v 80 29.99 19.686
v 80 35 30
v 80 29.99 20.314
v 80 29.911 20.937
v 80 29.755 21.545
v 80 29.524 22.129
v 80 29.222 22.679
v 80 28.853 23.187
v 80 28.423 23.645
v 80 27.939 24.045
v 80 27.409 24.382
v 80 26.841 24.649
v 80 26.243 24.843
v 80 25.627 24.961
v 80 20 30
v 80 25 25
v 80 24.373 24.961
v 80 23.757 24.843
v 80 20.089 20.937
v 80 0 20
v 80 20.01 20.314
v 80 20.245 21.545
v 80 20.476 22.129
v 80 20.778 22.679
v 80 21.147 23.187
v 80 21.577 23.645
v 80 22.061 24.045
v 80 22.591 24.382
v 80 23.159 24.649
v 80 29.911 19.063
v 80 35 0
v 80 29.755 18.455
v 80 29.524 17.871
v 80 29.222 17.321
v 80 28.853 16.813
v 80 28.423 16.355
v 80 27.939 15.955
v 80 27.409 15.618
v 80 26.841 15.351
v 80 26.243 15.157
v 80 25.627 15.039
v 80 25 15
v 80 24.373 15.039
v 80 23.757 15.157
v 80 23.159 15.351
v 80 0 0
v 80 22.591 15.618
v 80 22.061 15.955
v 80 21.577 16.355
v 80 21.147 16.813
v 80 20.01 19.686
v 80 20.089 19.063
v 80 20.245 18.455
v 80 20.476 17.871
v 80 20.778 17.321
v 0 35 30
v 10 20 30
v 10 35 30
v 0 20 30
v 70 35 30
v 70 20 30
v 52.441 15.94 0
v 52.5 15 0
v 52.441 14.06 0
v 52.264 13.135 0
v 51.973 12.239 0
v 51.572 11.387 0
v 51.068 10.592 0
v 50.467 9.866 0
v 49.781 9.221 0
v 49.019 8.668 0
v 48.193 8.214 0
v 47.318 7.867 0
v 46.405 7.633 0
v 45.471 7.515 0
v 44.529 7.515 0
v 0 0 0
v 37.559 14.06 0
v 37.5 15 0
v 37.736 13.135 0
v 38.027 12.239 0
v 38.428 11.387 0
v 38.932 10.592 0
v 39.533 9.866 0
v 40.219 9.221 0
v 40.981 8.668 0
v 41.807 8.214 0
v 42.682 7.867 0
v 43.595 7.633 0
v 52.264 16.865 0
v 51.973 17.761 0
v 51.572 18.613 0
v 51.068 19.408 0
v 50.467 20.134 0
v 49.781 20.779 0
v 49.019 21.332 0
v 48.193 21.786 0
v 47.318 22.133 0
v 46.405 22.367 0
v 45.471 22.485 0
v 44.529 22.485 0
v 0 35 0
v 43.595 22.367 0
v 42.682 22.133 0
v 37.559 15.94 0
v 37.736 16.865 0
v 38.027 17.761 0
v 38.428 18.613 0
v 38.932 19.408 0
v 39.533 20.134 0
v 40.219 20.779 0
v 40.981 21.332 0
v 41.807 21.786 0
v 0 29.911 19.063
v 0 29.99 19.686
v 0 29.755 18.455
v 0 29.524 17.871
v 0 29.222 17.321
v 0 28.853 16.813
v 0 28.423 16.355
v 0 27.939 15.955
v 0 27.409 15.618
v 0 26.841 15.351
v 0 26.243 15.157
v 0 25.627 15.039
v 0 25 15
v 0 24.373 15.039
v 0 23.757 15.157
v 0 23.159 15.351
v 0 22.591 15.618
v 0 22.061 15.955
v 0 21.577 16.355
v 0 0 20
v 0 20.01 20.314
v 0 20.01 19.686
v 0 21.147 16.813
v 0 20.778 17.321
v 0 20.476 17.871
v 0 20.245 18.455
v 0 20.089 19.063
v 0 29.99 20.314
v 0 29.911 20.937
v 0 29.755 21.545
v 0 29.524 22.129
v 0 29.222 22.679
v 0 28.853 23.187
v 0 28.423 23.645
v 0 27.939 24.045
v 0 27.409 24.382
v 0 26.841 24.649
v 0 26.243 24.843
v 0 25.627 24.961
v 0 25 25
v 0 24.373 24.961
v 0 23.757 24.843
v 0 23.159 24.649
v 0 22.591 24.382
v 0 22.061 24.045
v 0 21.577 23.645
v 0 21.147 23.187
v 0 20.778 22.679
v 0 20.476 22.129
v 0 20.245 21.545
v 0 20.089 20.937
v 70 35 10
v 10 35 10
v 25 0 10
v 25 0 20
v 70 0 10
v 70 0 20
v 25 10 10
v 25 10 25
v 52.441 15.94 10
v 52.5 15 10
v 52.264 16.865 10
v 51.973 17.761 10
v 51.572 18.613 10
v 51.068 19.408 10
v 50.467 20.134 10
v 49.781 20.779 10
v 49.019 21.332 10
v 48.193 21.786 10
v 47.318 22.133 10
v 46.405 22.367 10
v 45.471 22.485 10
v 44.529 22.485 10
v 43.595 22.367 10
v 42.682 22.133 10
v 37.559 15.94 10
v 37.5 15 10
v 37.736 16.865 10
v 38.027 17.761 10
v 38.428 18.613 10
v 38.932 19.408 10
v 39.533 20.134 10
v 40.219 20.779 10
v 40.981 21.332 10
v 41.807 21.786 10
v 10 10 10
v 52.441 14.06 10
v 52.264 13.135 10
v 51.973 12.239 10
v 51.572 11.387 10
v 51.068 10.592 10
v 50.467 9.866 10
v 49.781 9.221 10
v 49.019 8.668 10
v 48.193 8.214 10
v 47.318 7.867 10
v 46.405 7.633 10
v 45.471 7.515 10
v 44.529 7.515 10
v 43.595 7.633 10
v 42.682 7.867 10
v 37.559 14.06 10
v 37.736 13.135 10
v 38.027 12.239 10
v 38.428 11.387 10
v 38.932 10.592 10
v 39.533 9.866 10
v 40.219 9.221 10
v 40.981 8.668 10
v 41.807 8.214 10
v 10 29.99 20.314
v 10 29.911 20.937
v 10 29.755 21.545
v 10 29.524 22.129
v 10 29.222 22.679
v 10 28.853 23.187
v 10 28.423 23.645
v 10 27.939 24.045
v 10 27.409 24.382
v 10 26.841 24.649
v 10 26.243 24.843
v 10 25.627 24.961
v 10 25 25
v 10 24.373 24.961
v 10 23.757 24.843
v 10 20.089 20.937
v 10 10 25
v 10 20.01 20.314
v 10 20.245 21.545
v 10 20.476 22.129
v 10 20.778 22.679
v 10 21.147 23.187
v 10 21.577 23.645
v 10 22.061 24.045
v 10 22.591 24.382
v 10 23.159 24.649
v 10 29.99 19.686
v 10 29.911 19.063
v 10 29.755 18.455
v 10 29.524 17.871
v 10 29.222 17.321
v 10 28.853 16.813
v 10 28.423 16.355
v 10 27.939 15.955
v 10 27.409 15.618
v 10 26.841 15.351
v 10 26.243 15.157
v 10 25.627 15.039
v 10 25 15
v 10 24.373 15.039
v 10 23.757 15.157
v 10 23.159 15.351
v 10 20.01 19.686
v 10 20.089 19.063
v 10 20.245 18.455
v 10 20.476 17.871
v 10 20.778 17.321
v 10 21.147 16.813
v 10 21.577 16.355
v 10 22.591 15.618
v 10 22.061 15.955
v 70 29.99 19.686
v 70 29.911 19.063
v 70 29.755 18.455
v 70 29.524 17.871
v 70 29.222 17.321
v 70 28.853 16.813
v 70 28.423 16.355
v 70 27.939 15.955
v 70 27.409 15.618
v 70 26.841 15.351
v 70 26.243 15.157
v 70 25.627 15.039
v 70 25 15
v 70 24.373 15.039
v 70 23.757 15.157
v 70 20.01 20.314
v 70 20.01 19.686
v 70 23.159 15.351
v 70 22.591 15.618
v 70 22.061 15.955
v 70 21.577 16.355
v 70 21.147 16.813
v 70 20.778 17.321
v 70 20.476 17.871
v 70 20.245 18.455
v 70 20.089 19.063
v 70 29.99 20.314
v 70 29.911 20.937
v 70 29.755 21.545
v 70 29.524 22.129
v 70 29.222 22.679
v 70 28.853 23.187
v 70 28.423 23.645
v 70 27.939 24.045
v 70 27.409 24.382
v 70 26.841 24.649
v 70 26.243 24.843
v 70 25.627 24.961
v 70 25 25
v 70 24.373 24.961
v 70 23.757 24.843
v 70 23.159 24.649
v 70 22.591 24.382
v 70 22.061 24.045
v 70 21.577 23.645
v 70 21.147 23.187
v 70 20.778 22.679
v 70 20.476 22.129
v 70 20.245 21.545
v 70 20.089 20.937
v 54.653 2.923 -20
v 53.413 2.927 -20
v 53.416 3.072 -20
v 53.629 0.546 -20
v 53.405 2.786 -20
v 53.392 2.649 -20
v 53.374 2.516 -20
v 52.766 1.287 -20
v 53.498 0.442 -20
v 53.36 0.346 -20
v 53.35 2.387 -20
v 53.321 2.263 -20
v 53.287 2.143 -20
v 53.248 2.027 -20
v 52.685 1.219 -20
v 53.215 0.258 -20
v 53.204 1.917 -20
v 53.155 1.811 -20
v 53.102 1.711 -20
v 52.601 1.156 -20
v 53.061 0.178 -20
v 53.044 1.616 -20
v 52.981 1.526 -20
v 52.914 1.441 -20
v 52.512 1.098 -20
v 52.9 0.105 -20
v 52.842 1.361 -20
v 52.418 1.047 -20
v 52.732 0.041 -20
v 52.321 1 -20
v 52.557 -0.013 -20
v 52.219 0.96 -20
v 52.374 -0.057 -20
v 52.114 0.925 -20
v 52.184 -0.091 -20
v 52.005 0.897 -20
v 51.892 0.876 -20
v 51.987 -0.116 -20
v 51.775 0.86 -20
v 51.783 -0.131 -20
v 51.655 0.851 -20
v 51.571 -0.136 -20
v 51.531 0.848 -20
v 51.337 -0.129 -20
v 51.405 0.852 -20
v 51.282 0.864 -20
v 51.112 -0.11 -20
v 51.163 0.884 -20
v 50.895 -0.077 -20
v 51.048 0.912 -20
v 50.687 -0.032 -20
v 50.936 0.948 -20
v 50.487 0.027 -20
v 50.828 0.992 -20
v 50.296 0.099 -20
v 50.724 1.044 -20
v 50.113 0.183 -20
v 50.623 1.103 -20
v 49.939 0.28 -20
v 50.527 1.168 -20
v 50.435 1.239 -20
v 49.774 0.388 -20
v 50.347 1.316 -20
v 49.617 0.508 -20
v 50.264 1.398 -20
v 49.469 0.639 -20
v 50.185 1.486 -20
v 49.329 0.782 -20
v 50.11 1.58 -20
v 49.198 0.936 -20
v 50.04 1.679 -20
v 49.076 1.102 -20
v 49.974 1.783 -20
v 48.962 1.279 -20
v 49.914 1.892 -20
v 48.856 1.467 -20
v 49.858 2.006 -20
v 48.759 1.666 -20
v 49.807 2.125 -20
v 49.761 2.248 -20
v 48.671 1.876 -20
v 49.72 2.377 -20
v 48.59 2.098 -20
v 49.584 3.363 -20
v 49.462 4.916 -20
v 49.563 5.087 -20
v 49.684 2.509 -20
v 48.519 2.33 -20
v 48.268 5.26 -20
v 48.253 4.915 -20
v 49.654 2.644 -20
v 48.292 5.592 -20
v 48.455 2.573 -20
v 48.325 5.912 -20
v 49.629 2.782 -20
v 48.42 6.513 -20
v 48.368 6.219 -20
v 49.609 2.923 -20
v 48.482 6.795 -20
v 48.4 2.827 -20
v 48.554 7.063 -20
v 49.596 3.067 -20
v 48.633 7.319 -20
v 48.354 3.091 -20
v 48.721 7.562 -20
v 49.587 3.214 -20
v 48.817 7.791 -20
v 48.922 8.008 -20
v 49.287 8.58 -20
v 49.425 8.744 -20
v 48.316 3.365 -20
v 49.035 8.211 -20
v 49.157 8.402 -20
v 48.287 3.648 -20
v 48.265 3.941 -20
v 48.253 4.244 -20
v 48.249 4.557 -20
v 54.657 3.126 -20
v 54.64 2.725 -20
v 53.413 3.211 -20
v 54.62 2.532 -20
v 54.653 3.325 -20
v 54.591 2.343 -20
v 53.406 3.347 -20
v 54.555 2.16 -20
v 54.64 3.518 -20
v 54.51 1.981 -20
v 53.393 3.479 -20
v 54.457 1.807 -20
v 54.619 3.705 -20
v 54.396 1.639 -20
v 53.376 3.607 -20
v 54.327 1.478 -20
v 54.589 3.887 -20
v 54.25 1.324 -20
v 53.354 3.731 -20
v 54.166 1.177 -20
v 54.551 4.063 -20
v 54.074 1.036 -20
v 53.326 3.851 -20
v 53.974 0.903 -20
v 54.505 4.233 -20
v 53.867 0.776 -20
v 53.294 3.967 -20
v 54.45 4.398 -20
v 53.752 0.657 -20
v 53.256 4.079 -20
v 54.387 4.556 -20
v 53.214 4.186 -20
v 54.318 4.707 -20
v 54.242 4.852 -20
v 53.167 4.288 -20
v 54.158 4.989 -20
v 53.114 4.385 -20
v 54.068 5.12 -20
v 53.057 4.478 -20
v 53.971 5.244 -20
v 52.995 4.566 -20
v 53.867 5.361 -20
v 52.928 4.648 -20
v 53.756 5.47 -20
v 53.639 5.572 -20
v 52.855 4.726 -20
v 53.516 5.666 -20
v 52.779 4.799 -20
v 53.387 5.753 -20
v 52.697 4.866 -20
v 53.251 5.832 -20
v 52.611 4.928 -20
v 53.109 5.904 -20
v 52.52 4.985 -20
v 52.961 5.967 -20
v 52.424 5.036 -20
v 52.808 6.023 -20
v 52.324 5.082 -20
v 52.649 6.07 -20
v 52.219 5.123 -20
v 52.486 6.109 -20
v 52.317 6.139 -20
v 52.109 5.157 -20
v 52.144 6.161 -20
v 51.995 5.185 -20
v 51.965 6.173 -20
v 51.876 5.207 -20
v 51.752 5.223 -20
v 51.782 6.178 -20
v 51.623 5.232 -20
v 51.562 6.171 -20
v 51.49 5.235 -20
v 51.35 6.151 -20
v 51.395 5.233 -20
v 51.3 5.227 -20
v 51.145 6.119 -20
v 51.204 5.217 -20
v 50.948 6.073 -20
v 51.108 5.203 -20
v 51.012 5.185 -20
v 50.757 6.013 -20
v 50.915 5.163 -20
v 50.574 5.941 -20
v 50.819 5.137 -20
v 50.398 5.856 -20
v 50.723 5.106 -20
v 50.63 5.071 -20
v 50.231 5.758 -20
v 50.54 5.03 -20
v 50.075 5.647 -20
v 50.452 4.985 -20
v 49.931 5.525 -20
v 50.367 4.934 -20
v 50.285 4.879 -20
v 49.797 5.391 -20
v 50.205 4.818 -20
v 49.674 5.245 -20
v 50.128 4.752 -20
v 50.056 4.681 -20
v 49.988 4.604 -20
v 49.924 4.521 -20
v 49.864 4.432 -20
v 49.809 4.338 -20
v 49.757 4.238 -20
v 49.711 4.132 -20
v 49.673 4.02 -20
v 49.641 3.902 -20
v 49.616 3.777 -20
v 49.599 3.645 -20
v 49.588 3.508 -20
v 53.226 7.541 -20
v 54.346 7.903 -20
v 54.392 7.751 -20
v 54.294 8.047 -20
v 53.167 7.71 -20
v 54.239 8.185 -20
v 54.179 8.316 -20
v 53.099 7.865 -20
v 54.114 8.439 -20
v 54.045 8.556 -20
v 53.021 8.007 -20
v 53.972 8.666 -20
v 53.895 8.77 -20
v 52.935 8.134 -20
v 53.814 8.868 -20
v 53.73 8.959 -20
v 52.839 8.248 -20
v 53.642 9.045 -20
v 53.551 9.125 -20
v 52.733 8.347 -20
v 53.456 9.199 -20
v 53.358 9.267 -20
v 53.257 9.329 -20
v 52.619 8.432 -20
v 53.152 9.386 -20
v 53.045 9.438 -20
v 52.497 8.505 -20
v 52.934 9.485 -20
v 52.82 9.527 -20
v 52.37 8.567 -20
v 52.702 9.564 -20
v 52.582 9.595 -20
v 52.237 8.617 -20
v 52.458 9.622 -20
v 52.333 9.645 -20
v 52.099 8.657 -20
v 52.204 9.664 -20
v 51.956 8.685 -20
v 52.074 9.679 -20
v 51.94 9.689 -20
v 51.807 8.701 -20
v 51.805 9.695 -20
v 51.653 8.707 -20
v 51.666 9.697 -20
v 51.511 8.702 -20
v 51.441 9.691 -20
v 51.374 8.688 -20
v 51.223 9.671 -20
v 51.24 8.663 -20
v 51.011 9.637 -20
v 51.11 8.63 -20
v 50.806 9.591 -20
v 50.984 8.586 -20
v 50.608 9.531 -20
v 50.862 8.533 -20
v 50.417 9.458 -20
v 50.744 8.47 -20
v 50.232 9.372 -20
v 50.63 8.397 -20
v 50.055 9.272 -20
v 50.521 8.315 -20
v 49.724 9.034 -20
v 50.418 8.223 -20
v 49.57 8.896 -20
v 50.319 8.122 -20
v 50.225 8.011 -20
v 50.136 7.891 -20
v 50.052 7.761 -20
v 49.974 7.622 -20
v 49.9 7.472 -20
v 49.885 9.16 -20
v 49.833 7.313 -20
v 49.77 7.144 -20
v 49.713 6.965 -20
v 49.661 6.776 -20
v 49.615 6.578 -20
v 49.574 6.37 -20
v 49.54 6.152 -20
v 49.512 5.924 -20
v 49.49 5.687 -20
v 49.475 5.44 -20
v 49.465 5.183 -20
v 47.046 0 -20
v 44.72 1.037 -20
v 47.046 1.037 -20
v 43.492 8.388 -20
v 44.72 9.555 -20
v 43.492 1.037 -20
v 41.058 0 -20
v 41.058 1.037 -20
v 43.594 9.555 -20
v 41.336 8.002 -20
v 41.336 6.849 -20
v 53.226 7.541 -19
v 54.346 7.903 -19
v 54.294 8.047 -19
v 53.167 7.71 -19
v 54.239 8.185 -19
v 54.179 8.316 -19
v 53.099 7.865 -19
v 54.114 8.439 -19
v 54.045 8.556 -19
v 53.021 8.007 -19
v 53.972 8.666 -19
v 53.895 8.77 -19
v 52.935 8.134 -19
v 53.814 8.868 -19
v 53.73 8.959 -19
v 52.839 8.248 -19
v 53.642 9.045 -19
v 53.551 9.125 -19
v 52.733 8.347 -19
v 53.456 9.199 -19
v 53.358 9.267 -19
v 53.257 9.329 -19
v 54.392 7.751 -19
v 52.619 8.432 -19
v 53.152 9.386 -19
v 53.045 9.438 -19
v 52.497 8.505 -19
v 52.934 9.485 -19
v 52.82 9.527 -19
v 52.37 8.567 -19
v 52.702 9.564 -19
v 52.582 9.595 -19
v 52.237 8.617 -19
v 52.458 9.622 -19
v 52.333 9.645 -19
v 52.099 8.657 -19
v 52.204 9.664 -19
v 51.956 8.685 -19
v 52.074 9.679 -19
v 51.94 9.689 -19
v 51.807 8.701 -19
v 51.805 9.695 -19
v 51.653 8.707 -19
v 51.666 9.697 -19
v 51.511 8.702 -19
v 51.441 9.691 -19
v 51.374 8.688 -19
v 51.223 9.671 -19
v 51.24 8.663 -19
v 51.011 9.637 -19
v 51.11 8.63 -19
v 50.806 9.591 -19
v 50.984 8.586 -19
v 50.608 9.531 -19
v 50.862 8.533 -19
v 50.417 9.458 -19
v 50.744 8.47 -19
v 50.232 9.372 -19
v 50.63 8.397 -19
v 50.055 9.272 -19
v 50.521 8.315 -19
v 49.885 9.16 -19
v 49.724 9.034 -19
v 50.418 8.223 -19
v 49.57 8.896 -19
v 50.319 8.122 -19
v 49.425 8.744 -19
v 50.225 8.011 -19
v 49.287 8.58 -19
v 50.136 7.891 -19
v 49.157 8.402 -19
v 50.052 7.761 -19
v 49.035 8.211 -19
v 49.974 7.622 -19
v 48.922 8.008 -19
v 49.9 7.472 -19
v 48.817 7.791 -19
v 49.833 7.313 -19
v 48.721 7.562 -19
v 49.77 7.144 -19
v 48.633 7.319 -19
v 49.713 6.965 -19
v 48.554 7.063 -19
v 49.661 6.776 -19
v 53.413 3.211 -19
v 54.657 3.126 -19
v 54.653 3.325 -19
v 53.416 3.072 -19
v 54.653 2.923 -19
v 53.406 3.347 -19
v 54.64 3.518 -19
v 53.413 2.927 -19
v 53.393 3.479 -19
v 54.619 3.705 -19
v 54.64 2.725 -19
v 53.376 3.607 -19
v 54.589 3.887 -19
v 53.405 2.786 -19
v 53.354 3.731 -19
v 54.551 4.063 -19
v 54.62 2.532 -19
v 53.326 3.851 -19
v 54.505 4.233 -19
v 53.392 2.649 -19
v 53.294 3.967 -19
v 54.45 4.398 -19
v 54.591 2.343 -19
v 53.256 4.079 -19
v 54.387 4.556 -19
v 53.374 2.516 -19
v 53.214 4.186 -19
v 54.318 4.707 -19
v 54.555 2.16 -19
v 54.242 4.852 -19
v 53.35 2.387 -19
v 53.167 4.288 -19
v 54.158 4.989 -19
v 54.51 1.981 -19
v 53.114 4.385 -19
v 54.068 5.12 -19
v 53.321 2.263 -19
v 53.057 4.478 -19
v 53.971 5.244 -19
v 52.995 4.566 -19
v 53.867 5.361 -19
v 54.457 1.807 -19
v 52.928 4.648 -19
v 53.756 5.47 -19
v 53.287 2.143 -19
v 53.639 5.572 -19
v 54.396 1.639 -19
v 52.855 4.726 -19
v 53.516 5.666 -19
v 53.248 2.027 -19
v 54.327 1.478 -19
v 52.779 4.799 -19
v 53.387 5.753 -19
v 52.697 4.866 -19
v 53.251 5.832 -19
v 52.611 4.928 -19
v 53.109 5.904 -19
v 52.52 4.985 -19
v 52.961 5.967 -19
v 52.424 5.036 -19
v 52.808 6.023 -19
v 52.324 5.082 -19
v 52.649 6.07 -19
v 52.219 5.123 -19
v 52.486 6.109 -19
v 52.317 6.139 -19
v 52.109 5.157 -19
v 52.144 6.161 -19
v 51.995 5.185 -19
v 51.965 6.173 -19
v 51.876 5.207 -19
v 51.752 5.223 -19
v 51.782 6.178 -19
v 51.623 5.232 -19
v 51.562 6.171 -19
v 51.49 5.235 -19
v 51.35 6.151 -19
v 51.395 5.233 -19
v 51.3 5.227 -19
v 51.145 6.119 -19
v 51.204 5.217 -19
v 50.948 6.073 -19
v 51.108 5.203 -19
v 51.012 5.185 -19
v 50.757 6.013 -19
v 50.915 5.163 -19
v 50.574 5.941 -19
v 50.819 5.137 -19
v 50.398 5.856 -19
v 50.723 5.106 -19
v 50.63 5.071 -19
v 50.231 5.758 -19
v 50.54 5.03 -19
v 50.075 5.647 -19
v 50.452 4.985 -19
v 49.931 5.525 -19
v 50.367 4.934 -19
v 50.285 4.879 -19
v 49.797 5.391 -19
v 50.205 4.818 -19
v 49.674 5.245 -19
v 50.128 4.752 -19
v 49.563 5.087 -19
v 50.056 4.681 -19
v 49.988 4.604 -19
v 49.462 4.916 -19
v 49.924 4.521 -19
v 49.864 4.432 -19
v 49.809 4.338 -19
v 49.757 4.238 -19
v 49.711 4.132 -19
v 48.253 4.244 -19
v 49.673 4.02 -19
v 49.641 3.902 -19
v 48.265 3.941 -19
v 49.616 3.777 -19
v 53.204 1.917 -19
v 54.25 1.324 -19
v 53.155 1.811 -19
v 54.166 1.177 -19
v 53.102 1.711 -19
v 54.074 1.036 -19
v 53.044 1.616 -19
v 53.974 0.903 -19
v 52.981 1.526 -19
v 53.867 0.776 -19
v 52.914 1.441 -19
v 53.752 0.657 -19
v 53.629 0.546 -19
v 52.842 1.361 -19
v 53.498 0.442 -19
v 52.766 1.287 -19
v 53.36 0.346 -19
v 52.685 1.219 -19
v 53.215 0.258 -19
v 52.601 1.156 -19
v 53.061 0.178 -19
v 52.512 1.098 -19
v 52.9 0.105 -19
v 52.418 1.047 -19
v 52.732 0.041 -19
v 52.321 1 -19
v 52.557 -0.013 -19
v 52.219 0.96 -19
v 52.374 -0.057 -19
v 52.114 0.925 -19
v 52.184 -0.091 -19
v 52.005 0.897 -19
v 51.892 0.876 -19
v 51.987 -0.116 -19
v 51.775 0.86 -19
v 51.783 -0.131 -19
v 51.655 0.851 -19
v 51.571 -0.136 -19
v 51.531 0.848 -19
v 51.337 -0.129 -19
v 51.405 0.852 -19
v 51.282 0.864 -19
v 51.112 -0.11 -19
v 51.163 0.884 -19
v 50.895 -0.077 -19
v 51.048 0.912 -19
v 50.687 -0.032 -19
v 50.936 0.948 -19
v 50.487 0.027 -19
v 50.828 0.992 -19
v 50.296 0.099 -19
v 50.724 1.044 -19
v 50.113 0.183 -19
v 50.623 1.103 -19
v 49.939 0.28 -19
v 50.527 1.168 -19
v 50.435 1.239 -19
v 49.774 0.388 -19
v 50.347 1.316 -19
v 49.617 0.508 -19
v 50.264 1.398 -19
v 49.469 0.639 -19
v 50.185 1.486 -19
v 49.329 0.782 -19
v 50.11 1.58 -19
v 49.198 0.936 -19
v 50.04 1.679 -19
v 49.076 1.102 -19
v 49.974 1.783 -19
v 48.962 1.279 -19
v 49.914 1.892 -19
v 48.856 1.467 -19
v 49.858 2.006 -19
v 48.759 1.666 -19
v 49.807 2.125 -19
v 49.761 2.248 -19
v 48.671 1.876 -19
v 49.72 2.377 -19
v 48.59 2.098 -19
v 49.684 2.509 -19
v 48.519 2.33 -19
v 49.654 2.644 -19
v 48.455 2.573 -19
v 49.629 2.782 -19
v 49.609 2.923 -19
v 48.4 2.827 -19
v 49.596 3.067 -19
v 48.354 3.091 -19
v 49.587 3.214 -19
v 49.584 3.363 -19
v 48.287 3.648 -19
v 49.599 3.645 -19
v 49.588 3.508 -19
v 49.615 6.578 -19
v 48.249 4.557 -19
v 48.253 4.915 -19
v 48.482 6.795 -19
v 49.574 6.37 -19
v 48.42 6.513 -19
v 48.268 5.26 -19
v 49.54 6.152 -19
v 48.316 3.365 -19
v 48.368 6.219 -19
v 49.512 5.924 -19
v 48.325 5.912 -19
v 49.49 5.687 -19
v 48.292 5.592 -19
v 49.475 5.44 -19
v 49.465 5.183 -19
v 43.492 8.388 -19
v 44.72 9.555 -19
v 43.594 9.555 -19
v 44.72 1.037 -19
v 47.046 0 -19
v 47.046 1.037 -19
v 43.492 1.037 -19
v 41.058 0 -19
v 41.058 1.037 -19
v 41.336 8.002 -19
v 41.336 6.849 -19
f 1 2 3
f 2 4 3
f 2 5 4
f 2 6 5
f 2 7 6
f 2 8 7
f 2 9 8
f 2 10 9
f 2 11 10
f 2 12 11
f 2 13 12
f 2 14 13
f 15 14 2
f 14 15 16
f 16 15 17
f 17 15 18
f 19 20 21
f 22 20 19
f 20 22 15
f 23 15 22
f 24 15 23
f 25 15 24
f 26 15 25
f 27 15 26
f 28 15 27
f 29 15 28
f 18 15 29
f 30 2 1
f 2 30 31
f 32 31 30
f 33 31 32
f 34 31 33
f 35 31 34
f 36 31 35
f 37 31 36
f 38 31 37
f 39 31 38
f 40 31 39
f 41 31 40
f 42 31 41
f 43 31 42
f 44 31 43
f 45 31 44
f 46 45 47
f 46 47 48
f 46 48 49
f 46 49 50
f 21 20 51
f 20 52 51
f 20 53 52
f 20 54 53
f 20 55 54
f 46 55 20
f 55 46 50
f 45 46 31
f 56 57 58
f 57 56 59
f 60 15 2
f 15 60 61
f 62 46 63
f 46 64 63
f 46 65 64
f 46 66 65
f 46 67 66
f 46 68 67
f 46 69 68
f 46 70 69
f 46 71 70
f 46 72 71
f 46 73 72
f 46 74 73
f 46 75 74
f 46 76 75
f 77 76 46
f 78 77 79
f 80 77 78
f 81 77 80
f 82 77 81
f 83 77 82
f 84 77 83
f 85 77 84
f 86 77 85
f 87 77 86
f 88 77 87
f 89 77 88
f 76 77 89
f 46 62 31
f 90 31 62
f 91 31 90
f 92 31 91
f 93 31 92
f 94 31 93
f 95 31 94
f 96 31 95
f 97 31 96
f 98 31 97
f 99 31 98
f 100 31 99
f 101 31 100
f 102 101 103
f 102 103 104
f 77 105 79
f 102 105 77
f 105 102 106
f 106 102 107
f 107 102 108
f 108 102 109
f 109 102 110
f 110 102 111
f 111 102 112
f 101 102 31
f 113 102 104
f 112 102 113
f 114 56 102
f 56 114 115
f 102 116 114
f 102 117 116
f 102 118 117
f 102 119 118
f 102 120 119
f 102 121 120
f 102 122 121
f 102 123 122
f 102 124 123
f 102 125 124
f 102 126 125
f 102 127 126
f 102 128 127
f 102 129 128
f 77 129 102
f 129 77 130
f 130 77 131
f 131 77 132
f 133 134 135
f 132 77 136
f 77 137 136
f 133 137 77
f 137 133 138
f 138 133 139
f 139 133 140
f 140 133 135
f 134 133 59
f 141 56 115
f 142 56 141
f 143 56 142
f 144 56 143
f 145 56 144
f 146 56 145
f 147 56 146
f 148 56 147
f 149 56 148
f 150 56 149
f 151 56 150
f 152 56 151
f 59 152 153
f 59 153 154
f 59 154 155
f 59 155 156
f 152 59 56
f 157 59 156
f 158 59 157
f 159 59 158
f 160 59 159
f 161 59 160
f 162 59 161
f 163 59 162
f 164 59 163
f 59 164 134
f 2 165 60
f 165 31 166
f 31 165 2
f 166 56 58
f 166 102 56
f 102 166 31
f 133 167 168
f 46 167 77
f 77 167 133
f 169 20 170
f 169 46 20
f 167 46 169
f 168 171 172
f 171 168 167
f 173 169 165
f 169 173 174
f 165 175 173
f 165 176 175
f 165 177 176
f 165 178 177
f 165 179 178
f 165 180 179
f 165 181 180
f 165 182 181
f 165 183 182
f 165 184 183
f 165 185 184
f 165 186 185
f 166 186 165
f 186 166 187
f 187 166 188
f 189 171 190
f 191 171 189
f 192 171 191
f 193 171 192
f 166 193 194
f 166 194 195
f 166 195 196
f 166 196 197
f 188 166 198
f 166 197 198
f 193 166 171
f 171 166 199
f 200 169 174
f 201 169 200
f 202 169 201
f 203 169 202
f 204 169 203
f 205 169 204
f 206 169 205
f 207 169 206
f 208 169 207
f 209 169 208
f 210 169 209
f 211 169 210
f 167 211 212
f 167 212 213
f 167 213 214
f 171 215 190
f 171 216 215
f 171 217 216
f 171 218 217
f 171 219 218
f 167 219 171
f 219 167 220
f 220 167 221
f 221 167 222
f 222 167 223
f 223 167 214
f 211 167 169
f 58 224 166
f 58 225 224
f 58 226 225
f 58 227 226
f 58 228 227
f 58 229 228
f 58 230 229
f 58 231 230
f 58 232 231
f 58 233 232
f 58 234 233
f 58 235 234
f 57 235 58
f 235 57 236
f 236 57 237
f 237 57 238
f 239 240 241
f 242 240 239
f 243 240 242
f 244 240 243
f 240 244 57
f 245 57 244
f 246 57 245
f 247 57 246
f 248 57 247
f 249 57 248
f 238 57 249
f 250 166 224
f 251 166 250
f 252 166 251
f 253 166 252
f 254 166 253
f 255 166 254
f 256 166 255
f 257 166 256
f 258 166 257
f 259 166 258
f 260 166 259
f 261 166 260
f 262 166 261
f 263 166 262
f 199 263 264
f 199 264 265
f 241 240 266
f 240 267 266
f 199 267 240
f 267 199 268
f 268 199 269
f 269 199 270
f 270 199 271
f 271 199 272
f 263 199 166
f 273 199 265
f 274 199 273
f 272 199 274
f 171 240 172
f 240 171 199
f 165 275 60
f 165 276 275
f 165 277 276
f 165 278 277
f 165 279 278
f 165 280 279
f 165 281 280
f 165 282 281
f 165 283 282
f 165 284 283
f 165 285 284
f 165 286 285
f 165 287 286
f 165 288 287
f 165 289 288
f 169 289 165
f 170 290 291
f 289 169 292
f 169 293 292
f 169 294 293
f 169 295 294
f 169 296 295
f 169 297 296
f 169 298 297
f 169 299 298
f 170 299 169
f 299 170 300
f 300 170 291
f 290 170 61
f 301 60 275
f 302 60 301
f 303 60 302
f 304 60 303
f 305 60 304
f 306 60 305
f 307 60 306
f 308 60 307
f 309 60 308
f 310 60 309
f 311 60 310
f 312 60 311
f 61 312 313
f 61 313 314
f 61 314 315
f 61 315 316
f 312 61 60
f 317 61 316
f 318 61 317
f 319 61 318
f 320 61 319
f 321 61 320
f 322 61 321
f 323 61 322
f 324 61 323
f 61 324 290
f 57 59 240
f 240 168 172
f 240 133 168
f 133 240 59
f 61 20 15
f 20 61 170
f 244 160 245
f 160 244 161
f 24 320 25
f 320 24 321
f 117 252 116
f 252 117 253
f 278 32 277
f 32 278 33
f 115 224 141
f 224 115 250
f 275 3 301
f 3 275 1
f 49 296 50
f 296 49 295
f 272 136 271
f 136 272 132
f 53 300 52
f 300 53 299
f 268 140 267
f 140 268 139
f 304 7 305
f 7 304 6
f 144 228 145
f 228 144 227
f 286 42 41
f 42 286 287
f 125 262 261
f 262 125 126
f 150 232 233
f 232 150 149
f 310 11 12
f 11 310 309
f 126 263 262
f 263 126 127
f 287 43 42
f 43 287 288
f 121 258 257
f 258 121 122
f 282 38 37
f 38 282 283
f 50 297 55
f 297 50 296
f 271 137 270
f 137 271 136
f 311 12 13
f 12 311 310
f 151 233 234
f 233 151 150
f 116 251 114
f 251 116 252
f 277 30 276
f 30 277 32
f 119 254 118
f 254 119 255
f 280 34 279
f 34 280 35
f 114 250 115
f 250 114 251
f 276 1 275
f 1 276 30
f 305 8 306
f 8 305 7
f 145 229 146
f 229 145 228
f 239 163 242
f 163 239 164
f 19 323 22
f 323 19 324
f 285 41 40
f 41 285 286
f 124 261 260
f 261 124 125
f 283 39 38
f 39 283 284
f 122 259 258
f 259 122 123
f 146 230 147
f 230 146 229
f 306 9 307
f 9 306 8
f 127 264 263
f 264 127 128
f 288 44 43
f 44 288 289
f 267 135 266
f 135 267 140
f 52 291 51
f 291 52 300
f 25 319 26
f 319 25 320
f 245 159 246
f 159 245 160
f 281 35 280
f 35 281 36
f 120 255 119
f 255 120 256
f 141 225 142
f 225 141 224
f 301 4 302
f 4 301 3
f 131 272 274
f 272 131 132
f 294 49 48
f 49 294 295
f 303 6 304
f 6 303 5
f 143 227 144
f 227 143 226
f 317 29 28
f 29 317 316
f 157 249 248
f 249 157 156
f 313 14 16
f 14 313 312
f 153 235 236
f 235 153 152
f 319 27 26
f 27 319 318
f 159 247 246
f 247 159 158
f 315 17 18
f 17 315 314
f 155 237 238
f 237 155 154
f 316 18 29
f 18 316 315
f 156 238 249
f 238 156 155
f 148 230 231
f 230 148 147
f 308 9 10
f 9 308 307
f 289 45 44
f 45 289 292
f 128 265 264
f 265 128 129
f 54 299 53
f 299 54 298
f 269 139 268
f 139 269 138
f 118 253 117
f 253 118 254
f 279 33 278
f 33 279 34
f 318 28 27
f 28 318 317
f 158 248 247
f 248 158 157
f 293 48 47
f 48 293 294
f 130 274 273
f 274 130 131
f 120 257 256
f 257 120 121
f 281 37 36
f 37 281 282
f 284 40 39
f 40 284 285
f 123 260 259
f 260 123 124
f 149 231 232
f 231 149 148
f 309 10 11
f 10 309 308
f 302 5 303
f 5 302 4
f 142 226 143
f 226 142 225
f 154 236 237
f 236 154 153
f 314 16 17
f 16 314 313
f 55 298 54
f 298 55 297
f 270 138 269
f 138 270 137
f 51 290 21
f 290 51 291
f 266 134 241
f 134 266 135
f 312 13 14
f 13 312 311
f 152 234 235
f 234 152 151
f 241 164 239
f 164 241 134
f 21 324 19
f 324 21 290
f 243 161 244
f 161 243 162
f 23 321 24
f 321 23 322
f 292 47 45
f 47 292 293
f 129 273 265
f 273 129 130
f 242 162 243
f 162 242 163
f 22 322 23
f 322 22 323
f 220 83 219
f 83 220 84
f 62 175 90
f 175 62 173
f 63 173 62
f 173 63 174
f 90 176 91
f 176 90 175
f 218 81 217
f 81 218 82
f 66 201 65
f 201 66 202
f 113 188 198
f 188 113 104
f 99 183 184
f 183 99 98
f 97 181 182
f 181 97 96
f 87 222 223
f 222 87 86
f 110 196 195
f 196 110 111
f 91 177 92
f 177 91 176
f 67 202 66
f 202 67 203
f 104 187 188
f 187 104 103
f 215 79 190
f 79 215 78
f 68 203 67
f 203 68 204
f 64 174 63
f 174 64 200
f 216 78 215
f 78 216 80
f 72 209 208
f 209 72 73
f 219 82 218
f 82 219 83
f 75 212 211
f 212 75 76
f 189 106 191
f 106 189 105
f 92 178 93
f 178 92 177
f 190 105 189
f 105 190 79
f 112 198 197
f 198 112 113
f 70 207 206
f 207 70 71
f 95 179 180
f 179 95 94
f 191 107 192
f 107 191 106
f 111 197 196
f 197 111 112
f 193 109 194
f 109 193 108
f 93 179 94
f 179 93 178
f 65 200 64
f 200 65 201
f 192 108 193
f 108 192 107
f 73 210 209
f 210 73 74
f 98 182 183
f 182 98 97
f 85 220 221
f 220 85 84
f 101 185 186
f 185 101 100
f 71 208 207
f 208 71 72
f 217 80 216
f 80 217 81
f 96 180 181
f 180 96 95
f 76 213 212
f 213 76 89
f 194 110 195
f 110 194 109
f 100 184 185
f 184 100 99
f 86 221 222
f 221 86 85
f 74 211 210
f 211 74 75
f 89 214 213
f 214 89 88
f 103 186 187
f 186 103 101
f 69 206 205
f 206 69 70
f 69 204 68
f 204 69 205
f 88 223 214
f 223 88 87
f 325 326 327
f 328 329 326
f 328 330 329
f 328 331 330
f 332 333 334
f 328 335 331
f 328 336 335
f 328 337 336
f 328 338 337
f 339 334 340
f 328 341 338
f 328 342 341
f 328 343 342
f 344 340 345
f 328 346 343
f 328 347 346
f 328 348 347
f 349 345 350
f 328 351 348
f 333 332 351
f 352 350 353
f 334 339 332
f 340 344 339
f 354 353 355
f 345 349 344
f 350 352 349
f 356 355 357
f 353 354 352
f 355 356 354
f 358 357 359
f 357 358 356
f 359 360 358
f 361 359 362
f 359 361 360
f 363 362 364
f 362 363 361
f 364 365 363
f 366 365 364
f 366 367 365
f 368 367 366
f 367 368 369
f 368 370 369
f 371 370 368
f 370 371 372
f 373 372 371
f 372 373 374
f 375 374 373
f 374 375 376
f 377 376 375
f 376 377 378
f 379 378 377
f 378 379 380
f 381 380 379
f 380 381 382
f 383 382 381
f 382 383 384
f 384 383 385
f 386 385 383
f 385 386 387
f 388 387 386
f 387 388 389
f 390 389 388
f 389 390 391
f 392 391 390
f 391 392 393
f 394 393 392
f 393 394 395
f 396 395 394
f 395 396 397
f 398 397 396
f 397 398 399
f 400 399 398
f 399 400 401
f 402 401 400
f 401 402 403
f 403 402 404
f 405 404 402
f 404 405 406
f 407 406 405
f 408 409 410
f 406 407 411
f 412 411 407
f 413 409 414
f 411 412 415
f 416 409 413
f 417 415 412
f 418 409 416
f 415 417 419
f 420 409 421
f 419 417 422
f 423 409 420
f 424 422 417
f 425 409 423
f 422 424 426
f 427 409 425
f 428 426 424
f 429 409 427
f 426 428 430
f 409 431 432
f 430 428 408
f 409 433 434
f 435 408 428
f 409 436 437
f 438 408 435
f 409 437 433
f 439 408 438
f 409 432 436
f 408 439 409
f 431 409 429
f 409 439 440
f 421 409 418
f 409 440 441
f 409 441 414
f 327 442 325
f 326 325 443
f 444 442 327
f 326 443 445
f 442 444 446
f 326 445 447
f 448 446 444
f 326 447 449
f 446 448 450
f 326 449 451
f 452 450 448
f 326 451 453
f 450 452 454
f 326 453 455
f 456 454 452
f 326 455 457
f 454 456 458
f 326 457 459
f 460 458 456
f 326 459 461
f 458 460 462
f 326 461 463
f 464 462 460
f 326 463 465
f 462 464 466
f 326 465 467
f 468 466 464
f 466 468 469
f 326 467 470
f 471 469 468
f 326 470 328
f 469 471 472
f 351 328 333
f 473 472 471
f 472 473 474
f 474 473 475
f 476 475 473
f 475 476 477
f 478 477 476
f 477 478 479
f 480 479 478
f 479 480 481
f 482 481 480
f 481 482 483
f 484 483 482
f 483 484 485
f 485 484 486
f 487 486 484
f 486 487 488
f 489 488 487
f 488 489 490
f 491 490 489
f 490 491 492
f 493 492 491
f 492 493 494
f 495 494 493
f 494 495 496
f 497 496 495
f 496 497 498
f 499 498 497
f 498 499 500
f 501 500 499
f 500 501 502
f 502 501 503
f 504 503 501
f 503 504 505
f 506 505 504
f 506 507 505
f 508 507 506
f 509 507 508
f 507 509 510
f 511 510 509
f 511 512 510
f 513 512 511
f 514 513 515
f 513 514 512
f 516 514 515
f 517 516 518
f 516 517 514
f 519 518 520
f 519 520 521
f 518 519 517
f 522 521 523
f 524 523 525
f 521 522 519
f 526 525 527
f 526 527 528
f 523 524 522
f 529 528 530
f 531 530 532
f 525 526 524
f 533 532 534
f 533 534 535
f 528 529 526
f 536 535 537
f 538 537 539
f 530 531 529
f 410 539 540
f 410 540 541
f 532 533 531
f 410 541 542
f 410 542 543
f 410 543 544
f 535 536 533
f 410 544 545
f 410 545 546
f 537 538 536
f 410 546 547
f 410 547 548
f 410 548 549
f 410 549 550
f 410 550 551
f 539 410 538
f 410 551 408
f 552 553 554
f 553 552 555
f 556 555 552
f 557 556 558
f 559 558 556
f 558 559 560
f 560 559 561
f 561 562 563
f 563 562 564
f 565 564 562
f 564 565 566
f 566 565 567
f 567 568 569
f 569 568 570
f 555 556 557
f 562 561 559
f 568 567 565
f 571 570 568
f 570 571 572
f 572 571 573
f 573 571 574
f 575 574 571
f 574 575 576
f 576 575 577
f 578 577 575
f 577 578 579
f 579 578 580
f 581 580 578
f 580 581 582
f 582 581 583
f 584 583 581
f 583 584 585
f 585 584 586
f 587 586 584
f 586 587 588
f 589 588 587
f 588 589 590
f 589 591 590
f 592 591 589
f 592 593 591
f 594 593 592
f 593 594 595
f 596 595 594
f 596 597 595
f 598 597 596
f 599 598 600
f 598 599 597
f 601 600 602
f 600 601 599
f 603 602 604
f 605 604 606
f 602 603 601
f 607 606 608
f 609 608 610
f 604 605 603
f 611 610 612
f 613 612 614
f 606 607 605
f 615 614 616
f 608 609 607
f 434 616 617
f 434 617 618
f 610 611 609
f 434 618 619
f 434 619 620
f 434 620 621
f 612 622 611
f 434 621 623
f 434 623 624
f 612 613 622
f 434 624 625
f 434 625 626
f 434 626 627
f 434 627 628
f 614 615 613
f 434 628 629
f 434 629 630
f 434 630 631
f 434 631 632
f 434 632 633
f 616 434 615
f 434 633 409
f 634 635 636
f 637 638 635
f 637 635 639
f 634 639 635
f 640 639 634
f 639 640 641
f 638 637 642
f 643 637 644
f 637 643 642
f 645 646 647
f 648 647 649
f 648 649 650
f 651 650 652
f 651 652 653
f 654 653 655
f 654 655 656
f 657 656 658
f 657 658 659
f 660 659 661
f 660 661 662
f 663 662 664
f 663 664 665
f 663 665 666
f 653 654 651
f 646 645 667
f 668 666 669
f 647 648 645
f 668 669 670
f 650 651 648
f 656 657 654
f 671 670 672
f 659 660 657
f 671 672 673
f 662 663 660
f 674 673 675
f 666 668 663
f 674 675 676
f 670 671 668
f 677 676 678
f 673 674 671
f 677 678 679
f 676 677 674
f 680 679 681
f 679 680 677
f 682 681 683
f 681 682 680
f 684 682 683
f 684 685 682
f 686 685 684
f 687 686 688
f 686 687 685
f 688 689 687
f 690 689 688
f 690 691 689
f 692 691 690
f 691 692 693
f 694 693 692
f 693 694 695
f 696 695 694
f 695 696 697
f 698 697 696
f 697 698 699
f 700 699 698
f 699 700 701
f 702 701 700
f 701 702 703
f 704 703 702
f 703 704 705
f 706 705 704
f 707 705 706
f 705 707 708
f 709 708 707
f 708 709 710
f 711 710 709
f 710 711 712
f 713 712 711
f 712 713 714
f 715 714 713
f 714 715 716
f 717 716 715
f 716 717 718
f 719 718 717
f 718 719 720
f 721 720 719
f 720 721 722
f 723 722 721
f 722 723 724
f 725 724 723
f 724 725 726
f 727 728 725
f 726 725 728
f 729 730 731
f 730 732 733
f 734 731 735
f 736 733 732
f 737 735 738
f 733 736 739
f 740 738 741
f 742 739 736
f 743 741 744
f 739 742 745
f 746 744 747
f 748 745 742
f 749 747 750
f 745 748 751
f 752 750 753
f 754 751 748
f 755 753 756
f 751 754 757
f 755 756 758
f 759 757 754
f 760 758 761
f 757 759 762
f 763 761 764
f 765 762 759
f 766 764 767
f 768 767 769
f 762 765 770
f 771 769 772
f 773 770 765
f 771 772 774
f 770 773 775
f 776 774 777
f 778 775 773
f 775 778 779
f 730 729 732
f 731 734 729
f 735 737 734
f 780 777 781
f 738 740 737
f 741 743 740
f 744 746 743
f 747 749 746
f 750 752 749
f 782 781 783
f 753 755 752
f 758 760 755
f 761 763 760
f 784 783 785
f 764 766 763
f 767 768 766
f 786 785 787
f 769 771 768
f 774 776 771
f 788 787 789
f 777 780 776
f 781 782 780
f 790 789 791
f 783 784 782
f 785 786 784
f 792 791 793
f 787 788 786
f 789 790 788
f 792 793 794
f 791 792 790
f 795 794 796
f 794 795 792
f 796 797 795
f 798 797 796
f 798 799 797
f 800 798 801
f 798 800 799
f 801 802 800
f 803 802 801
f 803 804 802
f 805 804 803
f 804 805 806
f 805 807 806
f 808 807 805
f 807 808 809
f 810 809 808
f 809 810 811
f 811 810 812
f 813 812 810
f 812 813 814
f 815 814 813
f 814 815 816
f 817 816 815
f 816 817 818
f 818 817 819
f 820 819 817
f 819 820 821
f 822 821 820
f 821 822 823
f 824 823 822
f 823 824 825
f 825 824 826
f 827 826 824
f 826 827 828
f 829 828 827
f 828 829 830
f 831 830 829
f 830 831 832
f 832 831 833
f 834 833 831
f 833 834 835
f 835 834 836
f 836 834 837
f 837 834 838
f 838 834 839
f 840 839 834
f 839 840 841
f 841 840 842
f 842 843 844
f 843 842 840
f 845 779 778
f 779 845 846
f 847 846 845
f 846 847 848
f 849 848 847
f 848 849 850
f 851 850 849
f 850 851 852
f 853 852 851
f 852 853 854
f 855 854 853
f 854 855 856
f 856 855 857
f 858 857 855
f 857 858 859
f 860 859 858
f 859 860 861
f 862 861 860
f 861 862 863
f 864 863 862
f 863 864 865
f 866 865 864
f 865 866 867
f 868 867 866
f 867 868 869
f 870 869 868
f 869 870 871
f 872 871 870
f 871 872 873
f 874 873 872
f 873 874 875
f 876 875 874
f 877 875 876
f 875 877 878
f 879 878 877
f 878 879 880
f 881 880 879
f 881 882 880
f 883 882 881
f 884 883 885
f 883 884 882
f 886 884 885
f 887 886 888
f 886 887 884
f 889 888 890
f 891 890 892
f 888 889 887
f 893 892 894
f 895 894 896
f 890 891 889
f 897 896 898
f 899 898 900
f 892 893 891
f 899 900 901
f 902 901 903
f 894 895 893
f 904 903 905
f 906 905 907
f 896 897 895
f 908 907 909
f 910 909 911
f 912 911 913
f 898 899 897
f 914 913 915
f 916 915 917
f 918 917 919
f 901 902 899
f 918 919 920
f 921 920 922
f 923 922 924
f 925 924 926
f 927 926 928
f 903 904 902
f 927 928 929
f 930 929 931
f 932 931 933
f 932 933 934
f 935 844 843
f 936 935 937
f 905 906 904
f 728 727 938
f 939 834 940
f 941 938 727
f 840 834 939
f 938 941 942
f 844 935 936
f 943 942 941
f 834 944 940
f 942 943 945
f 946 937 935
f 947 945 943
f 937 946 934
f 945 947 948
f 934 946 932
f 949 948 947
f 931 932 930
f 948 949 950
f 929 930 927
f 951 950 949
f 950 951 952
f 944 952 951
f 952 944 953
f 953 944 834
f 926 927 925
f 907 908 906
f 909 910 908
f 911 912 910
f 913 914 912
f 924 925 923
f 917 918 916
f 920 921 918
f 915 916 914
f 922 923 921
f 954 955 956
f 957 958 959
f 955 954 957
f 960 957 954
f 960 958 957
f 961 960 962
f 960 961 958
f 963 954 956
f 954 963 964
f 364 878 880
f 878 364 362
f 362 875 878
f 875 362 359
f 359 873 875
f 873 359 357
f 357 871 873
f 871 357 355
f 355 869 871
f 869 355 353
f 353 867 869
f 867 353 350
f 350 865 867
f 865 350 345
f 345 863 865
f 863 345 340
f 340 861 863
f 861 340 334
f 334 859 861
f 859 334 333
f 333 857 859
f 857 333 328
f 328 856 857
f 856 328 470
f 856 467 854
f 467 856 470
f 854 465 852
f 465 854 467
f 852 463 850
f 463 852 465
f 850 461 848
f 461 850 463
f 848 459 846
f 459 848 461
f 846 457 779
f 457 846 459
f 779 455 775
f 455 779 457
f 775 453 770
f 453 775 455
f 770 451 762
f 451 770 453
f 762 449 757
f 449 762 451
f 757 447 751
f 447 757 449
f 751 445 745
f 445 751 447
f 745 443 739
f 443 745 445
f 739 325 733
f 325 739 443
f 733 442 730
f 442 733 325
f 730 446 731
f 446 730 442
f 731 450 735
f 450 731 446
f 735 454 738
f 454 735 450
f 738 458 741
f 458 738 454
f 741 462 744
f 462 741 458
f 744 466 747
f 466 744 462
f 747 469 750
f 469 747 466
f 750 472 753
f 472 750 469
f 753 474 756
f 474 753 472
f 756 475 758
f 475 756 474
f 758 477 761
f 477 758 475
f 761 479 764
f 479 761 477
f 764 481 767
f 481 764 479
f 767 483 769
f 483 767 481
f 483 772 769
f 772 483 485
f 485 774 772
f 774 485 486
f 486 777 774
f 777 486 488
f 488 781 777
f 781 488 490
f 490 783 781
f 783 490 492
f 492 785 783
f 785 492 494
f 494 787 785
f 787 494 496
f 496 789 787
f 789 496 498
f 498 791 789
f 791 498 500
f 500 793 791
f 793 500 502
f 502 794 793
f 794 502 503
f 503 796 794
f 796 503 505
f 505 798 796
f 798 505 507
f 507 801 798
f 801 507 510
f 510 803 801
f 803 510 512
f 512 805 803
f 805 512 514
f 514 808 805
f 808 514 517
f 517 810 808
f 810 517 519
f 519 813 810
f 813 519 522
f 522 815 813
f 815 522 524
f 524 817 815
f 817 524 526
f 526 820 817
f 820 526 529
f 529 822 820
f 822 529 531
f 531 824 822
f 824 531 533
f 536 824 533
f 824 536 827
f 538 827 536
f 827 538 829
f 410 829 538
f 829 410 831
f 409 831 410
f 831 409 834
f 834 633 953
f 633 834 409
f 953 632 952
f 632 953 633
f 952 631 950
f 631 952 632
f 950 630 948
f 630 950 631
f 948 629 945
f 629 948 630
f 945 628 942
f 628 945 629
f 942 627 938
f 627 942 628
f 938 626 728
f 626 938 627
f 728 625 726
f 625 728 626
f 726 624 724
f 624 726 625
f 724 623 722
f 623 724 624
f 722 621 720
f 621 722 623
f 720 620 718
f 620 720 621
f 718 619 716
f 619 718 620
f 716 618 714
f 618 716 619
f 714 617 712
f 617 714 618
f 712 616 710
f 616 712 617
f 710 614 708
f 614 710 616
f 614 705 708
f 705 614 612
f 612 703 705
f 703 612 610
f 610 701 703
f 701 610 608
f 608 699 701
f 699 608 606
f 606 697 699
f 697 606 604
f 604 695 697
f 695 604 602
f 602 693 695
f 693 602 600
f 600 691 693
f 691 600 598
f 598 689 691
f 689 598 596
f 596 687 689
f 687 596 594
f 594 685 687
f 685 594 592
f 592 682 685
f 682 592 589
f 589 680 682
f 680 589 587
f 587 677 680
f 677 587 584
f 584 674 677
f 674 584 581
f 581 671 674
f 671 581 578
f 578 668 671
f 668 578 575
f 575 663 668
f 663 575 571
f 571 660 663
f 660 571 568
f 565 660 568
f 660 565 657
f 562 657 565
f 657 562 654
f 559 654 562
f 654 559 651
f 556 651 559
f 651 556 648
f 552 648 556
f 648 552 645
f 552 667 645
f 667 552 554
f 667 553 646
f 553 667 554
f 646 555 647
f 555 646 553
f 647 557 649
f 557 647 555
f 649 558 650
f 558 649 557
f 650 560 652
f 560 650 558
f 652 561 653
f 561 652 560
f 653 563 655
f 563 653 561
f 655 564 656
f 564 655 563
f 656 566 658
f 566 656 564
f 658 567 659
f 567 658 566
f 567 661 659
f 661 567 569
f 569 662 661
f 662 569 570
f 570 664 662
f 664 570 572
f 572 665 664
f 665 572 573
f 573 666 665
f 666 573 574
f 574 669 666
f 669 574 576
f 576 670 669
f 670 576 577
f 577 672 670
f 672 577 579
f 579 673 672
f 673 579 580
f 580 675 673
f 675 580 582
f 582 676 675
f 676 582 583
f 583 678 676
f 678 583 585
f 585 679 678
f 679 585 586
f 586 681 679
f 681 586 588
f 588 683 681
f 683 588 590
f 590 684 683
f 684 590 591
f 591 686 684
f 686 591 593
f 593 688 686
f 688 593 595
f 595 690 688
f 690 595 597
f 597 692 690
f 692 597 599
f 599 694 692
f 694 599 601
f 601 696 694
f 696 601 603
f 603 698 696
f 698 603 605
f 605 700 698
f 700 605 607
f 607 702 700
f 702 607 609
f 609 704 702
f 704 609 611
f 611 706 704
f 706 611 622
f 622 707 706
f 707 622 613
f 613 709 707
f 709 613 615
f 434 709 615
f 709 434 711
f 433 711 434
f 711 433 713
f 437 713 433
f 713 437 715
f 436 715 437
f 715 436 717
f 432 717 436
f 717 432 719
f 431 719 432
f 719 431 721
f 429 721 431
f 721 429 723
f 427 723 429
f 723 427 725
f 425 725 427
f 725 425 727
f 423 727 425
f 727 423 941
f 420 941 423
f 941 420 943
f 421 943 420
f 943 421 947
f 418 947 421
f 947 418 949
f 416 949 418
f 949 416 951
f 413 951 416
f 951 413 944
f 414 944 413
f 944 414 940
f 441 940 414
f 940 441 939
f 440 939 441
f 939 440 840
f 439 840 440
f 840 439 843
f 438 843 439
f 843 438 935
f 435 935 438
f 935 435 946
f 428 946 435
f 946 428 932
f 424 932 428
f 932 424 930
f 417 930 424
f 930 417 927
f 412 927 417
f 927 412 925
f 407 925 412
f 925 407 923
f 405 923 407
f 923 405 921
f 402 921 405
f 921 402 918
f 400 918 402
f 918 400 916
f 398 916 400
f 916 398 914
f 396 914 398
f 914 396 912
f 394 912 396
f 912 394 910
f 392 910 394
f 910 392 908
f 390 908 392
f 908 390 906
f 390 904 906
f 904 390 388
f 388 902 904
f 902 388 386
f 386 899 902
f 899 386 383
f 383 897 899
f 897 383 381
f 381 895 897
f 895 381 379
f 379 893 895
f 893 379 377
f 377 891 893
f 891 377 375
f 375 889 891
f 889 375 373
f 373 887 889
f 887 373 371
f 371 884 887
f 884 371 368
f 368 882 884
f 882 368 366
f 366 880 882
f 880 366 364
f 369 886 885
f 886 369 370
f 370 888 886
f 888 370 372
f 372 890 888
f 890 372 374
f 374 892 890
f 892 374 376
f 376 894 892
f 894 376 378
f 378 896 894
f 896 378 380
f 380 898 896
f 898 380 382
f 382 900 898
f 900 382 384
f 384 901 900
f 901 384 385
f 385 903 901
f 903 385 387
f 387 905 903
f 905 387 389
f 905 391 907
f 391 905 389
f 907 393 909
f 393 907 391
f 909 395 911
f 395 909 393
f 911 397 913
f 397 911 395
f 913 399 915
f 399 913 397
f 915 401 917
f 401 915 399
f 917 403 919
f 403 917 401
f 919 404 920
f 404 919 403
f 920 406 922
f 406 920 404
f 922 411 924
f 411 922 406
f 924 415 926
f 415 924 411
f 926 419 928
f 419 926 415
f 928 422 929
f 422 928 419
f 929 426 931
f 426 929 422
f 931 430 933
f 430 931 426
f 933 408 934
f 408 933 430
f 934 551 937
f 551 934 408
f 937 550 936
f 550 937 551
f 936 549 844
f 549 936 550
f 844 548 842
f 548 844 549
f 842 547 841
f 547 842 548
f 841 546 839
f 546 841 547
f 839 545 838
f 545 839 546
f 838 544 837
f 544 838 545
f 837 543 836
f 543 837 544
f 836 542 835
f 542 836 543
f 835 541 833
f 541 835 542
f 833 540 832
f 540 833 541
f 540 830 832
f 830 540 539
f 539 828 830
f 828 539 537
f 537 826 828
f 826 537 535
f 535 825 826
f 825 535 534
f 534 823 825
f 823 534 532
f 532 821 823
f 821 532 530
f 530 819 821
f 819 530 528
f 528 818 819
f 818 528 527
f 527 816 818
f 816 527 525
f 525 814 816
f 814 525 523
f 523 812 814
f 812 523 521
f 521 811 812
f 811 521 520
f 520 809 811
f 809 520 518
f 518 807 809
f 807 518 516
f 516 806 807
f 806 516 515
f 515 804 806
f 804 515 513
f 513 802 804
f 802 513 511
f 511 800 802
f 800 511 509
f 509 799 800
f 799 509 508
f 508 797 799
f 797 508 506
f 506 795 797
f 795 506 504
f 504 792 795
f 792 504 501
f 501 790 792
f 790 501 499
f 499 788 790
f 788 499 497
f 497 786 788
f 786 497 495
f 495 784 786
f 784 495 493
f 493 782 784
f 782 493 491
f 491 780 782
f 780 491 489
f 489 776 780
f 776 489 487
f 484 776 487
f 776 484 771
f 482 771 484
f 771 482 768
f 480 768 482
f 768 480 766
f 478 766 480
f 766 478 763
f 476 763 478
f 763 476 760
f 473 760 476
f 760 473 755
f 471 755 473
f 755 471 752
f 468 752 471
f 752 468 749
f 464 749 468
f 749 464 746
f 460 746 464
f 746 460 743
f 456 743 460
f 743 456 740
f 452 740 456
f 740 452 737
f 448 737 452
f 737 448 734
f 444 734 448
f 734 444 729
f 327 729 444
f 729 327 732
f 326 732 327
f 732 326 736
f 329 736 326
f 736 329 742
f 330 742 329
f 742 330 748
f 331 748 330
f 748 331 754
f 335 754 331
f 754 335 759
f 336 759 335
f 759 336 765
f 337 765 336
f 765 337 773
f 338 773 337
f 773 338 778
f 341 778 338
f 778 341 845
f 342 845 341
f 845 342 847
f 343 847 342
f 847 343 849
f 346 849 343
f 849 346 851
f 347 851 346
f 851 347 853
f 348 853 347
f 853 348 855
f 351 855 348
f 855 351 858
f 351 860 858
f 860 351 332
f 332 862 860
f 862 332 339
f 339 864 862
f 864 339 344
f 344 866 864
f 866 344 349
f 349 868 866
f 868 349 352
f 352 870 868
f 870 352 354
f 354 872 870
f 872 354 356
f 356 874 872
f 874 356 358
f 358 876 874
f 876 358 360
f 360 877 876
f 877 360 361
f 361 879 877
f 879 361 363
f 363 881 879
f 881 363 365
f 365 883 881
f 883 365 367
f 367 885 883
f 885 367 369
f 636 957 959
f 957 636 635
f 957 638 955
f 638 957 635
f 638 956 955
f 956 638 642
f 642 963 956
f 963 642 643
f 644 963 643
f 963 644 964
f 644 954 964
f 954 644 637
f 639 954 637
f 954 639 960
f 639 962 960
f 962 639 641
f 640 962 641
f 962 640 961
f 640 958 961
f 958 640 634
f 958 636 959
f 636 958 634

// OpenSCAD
$fn=50;

cw=80;
cd=35;
ch=30;
cy=10;

difference() {
    cube([cw,cd,ch]);
    translate([10,10,10])
    cube([15,cd-10,ch-10]);
    translate([25,0,10])
    cube([45,cd,ch-10]);
    translate([0,0,30])
    rotate([0,90,0])
    linear_extrude(height=cw)
    polygon([[0,0],[10,0],[0,20]]);
    translate([0,cd-10,ch-10])
    rotate([0,90,0])
    cylinder(h=cw,d=cy);
    translate([45,15.0])
    cylinder(h=10,d=15);
}


translate([cw/2,0,-20])
linear_extrude(height=1)
text("16");
